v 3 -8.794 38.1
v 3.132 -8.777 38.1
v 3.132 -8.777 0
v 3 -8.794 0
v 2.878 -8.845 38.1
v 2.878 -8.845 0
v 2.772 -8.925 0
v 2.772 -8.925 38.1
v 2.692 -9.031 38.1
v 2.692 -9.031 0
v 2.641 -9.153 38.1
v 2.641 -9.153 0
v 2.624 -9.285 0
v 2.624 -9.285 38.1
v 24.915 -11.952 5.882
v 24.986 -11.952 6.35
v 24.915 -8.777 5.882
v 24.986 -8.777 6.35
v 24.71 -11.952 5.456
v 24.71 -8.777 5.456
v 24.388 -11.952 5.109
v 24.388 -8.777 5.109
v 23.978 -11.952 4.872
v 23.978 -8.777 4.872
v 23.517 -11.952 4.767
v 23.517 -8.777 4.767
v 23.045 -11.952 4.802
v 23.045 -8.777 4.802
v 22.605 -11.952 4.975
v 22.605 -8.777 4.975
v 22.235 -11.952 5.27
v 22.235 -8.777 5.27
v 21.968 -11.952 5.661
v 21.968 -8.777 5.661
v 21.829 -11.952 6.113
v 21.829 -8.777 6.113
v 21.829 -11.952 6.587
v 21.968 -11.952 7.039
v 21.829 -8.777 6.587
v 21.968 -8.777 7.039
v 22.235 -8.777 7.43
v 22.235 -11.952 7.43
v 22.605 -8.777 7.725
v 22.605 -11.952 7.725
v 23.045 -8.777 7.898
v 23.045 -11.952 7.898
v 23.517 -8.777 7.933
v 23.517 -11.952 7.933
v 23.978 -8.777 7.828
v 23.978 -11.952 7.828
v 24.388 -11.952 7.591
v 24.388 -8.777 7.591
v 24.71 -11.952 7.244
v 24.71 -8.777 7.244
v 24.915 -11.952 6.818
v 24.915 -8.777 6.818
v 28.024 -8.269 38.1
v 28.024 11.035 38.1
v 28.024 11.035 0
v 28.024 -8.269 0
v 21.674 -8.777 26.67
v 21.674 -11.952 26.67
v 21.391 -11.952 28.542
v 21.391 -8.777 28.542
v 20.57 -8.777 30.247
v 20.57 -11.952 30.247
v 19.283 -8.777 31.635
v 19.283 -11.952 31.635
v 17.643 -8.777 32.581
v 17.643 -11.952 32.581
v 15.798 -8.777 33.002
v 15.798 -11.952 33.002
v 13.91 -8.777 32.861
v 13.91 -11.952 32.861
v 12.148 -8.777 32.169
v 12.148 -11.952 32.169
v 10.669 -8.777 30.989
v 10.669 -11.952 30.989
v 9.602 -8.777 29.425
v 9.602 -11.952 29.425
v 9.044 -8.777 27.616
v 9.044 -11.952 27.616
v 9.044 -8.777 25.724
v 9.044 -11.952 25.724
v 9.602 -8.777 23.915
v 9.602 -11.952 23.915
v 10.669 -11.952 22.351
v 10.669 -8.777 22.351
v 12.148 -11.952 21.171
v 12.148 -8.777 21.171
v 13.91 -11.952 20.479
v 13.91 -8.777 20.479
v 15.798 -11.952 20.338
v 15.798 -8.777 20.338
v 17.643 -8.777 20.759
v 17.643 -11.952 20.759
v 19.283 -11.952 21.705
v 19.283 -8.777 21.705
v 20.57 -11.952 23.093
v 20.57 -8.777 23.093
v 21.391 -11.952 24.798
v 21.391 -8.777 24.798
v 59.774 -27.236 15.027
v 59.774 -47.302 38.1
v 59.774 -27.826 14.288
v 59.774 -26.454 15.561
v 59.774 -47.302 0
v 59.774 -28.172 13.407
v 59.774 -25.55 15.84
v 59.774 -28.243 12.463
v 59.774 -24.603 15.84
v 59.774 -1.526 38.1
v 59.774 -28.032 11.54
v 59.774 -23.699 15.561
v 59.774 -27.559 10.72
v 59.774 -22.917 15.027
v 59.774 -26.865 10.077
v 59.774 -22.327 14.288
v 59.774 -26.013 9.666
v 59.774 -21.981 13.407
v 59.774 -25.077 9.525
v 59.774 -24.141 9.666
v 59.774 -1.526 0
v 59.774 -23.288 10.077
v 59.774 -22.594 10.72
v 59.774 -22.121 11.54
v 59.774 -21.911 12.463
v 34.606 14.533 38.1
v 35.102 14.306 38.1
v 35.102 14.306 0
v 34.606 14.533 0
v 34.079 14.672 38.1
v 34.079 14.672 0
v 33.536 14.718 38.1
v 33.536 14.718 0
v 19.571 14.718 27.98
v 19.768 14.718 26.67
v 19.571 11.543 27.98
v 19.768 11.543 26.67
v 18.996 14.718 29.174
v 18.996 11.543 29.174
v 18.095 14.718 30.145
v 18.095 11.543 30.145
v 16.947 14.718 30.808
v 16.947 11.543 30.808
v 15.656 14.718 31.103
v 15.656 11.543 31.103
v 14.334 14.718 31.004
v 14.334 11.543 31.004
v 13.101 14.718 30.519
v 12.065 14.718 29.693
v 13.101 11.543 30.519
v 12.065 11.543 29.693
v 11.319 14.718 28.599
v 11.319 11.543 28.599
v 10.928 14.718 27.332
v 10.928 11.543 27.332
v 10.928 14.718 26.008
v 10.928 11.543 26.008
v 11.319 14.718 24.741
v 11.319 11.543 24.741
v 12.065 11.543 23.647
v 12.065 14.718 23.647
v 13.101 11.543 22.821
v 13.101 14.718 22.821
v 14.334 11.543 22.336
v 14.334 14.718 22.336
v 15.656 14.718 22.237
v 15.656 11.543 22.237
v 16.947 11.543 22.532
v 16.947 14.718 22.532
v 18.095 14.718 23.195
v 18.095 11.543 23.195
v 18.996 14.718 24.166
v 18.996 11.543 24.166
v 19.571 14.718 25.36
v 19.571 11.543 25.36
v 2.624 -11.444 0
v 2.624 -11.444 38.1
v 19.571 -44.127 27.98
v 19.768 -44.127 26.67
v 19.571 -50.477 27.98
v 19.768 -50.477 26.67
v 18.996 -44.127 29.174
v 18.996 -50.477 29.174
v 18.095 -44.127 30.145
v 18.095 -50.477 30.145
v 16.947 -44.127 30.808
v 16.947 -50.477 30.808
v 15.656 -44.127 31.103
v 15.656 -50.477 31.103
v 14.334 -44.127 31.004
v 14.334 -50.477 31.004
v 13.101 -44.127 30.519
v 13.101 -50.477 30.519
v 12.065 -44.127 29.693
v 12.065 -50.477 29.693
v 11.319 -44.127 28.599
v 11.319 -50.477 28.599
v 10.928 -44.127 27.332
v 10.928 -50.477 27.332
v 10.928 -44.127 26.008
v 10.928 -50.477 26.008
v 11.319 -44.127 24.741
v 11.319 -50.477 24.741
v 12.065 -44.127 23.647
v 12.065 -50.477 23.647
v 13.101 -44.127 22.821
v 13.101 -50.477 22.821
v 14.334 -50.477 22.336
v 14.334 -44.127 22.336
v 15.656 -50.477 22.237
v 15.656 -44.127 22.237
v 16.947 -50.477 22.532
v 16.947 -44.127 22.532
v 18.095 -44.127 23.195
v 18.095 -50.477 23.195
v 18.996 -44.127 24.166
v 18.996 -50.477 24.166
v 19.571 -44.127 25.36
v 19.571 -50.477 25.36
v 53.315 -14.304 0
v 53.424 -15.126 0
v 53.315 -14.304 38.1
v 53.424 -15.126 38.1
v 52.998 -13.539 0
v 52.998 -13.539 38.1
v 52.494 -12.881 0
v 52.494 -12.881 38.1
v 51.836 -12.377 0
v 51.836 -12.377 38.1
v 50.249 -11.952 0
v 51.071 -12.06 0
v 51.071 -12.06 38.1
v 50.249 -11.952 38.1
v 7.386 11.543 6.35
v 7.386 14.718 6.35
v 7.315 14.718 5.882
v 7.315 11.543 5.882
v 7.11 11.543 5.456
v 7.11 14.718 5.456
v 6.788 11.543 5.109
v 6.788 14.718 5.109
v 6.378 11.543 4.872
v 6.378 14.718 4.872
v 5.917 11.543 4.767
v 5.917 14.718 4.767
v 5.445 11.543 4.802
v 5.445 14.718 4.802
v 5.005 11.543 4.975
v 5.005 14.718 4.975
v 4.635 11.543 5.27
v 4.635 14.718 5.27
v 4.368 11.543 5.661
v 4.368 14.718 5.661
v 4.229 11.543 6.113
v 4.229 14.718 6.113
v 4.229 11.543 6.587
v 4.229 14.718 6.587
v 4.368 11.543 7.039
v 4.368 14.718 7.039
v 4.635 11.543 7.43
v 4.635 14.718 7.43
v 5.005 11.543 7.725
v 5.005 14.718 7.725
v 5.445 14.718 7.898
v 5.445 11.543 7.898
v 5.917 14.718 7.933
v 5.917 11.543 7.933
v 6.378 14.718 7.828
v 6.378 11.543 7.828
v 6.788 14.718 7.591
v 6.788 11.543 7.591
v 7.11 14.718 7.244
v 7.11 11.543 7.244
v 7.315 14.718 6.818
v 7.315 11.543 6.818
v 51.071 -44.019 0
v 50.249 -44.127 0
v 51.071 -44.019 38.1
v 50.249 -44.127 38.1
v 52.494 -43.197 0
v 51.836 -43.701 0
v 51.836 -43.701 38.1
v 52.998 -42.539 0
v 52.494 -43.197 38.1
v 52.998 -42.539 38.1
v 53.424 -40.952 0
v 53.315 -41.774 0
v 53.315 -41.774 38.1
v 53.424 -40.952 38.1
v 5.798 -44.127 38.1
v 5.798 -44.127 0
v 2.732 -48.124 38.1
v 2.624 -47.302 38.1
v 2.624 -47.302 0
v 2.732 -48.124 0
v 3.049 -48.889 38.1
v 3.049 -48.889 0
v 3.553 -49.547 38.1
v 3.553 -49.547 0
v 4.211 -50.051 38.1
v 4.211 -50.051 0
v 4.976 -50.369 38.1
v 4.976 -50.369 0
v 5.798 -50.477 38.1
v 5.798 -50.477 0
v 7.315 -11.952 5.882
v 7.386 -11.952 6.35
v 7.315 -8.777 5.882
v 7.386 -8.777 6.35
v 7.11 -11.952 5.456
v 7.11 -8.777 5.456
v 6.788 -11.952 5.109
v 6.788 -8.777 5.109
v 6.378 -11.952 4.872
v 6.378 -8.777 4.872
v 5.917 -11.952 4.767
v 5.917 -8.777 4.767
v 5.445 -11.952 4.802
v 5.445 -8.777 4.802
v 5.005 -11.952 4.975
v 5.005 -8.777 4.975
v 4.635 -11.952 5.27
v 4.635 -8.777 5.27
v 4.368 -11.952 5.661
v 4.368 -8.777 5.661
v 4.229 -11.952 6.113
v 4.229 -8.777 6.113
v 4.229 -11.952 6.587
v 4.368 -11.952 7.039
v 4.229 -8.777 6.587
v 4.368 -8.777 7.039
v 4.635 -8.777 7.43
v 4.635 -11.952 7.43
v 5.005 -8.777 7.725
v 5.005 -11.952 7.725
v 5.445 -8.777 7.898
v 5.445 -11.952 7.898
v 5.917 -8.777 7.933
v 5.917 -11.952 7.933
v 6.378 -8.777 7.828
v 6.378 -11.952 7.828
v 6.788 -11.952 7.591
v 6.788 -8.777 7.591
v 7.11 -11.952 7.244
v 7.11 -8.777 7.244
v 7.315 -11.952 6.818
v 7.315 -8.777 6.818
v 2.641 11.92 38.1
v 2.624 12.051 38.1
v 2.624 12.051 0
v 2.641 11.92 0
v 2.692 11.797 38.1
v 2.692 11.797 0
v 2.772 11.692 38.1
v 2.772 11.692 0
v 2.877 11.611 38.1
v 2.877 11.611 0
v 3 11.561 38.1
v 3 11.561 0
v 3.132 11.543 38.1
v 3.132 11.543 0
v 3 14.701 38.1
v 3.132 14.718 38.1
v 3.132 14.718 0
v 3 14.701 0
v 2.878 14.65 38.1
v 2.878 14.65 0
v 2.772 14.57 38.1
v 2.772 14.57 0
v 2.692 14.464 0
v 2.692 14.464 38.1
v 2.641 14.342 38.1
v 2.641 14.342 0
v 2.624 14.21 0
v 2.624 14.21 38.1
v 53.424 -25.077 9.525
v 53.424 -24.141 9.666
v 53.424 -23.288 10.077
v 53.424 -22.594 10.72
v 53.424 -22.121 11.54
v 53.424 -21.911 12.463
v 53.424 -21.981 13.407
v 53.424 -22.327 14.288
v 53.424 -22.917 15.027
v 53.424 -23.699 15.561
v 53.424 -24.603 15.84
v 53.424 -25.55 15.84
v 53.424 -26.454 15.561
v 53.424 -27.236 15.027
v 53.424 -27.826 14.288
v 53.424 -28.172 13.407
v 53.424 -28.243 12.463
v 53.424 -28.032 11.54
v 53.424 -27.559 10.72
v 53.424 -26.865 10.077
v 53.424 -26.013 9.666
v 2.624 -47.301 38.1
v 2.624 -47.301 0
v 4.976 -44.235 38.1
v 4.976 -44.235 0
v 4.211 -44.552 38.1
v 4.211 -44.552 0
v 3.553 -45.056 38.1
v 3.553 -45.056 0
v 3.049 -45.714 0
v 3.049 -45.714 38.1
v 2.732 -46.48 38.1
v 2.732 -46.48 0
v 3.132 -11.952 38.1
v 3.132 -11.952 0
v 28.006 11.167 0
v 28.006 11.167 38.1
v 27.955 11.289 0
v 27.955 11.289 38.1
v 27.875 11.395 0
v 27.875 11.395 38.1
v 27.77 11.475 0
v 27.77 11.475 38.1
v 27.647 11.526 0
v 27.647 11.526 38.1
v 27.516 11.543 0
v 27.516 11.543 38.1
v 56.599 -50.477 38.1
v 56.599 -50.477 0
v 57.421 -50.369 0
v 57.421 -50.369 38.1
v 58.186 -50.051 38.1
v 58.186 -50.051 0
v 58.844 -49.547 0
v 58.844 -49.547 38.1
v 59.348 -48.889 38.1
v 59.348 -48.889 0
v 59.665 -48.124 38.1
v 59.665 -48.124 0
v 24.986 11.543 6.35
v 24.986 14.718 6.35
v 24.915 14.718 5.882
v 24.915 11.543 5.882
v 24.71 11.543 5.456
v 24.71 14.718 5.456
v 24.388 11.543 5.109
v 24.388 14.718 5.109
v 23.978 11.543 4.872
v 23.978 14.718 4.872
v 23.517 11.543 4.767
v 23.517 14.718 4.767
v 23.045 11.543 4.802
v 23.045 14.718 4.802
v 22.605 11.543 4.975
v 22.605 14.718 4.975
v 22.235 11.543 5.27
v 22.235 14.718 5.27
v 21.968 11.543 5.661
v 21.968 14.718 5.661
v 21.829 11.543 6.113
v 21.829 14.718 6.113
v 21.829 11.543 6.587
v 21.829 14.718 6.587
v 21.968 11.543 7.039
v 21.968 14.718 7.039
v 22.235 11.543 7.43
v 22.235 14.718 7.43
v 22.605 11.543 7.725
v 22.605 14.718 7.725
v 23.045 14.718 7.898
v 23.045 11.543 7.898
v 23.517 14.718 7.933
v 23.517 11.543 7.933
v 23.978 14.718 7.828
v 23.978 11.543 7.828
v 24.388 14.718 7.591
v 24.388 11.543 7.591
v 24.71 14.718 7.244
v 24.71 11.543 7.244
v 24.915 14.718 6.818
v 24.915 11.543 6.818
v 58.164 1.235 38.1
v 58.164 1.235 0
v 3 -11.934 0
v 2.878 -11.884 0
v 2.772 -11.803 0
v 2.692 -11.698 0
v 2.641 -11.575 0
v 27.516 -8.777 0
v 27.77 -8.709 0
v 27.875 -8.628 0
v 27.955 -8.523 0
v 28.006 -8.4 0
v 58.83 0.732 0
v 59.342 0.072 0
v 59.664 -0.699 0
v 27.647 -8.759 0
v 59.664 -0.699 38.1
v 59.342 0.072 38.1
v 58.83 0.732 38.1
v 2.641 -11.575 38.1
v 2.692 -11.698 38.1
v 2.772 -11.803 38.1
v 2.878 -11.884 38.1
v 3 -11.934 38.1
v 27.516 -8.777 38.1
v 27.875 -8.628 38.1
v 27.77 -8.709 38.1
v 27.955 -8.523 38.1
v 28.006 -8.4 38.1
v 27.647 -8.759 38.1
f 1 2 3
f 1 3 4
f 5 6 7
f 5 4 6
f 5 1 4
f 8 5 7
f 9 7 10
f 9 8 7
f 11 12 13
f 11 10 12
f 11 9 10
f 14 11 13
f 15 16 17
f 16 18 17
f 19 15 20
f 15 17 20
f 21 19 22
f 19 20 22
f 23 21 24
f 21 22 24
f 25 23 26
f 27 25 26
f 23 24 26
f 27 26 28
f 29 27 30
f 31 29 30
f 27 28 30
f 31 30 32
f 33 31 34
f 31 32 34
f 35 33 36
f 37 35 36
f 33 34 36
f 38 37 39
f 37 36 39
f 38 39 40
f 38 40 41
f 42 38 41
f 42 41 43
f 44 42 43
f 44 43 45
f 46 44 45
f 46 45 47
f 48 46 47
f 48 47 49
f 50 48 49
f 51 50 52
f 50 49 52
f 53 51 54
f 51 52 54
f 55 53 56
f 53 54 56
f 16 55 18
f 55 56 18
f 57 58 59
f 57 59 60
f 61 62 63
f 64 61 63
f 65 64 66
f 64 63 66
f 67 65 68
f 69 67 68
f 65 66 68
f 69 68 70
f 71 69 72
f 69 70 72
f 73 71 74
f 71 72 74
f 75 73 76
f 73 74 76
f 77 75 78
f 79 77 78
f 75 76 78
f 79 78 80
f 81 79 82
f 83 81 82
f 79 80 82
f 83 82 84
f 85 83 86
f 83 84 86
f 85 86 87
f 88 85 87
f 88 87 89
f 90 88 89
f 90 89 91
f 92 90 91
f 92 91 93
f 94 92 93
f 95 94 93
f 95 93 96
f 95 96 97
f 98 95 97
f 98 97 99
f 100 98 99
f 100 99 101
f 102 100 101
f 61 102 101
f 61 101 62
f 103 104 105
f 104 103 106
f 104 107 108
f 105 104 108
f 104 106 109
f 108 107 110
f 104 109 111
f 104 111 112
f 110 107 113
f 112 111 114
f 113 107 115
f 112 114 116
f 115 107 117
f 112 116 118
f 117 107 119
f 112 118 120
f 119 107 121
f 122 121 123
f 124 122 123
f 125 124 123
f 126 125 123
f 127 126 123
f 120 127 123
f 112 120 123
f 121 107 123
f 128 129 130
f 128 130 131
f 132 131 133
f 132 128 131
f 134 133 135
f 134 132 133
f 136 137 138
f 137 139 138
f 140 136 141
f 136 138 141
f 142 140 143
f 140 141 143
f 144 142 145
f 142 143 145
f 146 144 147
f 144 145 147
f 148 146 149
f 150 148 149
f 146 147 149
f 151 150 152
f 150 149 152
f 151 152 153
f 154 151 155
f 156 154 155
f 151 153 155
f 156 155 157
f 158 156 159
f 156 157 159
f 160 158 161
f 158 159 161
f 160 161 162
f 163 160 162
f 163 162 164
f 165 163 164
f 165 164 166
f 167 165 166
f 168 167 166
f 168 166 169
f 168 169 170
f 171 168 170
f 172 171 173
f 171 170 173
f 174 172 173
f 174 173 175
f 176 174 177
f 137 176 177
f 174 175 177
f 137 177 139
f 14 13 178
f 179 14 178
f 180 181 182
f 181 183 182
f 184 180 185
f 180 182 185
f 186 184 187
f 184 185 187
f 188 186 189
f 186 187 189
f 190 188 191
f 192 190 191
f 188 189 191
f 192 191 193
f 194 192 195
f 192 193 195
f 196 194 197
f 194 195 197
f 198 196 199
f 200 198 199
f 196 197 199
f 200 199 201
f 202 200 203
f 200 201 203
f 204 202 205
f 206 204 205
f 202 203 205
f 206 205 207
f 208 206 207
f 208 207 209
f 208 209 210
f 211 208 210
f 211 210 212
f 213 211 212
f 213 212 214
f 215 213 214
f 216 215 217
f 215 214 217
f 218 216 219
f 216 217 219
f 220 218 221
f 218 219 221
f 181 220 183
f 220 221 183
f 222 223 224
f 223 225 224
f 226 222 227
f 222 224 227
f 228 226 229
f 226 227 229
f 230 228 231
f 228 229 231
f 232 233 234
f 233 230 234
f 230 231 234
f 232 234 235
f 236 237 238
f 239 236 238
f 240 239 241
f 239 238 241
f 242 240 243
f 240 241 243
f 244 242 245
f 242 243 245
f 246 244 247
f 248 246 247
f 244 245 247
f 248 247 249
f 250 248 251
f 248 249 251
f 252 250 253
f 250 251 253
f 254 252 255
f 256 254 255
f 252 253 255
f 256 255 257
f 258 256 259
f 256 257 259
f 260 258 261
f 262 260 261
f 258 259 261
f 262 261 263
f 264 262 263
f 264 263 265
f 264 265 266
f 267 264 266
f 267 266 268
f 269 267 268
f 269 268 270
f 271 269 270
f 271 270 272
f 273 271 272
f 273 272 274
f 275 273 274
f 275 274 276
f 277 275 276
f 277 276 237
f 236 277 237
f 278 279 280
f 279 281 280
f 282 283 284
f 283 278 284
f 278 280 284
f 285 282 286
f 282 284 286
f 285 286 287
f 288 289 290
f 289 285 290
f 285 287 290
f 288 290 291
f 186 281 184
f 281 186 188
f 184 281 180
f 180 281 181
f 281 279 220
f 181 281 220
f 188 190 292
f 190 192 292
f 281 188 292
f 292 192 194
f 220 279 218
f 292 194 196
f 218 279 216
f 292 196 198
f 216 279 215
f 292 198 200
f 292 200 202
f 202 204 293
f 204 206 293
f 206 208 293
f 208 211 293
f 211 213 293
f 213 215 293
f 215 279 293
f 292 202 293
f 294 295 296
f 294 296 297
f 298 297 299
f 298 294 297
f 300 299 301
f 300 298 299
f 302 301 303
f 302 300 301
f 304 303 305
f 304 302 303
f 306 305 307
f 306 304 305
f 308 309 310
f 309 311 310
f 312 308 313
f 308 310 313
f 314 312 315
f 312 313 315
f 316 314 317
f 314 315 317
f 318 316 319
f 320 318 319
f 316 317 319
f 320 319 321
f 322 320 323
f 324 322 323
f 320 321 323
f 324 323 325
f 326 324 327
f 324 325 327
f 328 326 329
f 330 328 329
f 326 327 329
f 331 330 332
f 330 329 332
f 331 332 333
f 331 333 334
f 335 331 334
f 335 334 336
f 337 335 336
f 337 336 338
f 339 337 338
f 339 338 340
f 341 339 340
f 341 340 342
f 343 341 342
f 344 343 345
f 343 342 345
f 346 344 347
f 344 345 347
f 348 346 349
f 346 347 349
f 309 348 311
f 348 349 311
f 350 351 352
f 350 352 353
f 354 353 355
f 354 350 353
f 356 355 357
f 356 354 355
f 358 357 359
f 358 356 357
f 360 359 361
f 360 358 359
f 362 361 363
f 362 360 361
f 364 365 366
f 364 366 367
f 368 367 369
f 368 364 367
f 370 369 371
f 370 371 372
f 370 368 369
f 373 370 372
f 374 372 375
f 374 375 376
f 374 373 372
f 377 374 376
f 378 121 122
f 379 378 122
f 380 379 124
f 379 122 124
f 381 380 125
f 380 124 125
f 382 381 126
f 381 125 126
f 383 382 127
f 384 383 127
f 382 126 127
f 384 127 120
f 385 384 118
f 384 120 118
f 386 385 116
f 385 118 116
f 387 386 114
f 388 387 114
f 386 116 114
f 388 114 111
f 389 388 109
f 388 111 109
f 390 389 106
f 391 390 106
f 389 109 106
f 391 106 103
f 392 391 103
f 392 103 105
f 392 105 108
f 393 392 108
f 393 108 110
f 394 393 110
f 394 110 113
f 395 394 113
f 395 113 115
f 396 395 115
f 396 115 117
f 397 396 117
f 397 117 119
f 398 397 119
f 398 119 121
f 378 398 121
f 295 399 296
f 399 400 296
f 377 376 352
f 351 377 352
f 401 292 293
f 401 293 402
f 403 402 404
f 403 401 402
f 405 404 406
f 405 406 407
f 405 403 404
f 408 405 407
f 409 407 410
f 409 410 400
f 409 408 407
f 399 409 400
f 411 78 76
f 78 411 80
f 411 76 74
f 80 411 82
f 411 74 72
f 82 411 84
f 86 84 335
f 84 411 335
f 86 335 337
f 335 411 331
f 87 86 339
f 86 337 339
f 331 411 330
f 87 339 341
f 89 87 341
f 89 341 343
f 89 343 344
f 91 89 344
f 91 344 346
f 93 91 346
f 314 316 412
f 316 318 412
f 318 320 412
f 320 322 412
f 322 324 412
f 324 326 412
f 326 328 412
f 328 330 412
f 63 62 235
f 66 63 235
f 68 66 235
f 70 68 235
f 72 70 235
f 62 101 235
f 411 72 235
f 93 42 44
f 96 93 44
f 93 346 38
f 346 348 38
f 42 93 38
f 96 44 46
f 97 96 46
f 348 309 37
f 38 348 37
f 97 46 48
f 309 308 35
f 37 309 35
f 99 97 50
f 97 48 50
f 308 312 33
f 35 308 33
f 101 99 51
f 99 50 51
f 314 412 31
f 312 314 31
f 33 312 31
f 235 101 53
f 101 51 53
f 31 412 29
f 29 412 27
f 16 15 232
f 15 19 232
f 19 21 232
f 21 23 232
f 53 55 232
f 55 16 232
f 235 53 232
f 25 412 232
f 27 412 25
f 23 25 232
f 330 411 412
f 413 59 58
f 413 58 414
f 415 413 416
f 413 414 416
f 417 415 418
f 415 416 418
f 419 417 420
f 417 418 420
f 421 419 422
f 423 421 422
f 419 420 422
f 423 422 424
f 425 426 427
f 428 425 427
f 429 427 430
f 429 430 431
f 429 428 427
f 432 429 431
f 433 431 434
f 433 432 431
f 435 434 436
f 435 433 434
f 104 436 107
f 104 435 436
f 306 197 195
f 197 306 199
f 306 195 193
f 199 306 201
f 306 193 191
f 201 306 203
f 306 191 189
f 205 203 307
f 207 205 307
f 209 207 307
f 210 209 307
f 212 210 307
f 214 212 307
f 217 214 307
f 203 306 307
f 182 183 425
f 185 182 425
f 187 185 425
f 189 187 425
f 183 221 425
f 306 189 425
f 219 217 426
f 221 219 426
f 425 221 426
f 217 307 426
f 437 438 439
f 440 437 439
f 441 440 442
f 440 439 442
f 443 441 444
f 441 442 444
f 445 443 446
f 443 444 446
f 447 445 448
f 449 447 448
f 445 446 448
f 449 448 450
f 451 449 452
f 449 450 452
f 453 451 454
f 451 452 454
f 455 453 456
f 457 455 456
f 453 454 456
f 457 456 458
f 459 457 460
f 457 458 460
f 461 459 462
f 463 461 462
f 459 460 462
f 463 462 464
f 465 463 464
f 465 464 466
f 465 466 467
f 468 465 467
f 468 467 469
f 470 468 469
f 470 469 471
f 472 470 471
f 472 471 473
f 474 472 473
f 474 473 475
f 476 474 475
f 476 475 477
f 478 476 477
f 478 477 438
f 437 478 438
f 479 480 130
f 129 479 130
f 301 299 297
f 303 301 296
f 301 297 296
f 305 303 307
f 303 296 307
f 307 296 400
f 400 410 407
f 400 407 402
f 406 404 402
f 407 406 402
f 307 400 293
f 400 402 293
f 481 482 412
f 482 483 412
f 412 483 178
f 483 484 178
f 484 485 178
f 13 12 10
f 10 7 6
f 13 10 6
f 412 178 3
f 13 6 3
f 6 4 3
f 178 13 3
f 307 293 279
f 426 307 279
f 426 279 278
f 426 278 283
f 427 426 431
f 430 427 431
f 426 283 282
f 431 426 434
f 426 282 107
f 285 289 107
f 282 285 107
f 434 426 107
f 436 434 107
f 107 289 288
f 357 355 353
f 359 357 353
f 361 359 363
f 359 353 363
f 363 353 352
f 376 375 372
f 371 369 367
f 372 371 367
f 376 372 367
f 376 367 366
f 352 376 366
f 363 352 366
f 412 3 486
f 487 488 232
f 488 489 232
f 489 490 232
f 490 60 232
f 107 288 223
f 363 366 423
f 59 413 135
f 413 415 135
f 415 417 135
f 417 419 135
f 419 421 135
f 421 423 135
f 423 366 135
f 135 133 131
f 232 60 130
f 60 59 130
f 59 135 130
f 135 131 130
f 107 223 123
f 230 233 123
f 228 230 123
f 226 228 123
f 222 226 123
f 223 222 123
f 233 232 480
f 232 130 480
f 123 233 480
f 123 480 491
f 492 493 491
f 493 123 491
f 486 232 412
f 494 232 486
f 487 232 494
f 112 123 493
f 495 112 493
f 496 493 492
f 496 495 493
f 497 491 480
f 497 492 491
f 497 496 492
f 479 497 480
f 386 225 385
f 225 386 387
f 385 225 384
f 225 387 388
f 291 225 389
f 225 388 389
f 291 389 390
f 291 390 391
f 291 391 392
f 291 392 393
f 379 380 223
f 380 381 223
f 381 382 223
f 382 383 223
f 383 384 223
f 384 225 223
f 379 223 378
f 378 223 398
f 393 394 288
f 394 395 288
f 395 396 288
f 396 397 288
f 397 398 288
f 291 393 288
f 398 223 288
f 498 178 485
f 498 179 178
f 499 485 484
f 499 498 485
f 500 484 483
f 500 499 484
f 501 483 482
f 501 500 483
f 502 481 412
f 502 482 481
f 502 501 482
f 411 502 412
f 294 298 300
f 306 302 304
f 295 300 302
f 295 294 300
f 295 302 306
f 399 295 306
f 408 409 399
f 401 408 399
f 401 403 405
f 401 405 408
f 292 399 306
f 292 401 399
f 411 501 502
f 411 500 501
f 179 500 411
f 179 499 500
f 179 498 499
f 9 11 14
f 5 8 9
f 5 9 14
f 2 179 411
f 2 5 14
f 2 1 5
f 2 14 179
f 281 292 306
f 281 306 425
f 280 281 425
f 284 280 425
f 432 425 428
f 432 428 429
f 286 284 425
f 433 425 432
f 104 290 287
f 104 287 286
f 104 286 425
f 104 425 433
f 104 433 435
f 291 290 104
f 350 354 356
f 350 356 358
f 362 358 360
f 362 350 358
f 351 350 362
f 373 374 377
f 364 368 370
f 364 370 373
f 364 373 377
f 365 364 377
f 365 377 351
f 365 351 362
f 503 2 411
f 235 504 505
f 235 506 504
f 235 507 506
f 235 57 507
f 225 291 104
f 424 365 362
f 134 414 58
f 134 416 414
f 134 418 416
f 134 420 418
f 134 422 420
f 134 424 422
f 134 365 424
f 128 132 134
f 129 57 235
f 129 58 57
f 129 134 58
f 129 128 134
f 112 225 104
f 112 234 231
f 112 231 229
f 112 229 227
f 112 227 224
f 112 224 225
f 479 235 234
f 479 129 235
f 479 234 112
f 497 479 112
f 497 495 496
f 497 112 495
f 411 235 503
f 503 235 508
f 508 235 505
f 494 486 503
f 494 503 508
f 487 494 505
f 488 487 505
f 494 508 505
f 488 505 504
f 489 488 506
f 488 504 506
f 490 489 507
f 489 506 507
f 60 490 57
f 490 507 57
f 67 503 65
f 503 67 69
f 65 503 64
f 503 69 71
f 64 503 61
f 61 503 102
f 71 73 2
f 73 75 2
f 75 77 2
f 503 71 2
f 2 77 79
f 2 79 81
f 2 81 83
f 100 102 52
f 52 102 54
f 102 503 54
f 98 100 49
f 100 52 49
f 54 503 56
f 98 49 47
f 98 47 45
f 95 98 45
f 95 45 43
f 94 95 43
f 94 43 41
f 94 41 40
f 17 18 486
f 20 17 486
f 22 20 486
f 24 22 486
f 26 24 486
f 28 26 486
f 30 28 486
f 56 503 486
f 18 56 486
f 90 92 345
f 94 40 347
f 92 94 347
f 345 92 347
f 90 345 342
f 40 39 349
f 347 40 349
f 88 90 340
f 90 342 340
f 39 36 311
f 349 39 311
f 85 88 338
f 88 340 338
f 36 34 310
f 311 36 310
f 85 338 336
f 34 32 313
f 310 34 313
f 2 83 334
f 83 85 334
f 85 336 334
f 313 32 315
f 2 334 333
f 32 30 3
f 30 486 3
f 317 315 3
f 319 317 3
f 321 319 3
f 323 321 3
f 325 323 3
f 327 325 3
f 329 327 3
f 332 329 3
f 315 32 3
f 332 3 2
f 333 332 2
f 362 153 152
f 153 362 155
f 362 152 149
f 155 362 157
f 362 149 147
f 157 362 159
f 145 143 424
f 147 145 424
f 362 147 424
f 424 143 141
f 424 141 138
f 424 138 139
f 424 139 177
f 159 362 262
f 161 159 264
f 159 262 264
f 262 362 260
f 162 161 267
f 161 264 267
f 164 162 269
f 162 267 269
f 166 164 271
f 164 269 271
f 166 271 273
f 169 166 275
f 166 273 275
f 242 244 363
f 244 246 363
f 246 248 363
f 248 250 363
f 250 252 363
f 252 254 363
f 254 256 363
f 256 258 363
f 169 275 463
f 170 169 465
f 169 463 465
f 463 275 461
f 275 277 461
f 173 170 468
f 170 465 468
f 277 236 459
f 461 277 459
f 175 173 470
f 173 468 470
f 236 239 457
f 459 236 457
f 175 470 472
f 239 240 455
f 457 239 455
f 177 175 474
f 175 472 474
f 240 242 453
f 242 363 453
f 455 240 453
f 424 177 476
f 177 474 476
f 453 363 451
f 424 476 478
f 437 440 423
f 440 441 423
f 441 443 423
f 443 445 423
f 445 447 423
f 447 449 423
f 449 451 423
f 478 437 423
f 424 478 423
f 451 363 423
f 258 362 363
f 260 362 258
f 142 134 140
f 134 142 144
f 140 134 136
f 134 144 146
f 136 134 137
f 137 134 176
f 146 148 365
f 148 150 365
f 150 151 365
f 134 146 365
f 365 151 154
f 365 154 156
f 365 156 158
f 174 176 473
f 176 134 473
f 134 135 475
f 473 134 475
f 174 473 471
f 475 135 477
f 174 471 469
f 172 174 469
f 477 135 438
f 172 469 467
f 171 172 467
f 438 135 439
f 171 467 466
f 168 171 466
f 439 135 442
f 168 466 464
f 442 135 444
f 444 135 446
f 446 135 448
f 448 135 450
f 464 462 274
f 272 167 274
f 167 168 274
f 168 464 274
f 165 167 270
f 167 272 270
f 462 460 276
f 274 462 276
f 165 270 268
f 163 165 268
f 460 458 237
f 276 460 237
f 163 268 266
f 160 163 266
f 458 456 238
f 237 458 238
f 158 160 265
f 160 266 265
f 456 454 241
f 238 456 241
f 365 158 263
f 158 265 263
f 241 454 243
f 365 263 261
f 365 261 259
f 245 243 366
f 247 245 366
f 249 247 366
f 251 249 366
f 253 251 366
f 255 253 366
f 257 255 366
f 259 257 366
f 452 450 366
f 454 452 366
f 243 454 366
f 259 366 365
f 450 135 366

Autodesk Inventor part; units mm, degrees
ref_plane "YZ Plane" through (0, 0, 0) normal (1, 0, 0) x (0, 1, 0)
ref_plane "XZ Plane" through (0, 0, 0) normal (0, 1, 0) x (-1, 0, 0)
ref_plane "XY Plane" through (0, 0, 0) normal (0, 0, 1) x (1, 0, 0)
sketch "Sketch1" plane through (0, 0, 0) normal (0, 0, 1) x (1, 0, 0)
  line L0 (2.6235, 11.5434) -> (28.0235, 11.5434)
  line L1 (28.0235, 11.5434) -> (28.0235, 14.7184)
  line L2 (28.0235, 14.7184) -> (2.6235, 14.7184)
  line L3 (2.6235, 14.7184) -> (2.6235, 11.5434)
  line L4 (28.0235, -8.7766) -> (2.6235, -8.7766)
  line L5 (2.6235, -8.7766) -> (2.6235, -11.9516)
  line L6 (2.6235, -11.9516) -> (28.0235, -11.9516)
  line L7 (28.0235, -11.9516) -> (28.0235, -8.7766)
  line L8 (28.0235, -11.9516) -> (34.3735, -11.9516)
  line L9 (34.3735, -11.9516) -> (34.3735, 14.7184)
  line L10 (34.3735, 14.7184) -> (28.0235, 14.7184)
  line L11 (28.0235, 14.7184) -> (28.0235, -11.9516)
  line L12 (2.6235, -50.4767) -> (53.4235, -50.4767)
  line L13 (53.4235, -50.4767) -> (53.4235, -44.1267)
  line L14 (53.4235, -44.1267) -> (2.6235, -44.1267)
  line L15 (2.6235, -44.1267) -> (2.6235, -50.4767)
  line L16 (53.4235, -50.4767) -> (59.7735, -50.4767)
  line L17 (59.7735, -50.4767) -> (59.7735, 0.3233)
  line L18 (59.7735, 0.3233) -> (53.4235, 0.3233)
  line L19 (53.4235, 0.3233) -> (53.4235, -50.4767)
  line L20 (34.3735, -11.9516) -> (53.4235, -11.9516)
  line L21 (59.7735, 0.3233) -> (34.3735, 14.7184)
  point P0 (0, 0)
  dimension "d22" = 27.94
  dimension "d0" = 25.4
  dimension "d1" = 3.175
  dimension "d2" = 3.175
  dimension "d3" = 20.32
  dimension "d4" = 6.35
  dimension "d5" = 50.8
  dimension "d6" = 6.35
  dimension "d7" = 6.35
  dimension "d8" = 50.8
extrude "Extrusion1" add sketch "Sketch1" along normal blind 38.1
sketch "Sketch2" plane through (59.7735, -50.4767, 0) normal (1, 0, 0) x (0, 0, -1)
  circle A0 centre (-12.7, 25.4) radius 3.175
  line L0 (0, 50.8) -> (-38.1, 50.8) projected
  line L1 (-38.1, 0) -> (-38.1, 50.8) projected
  point P0 (0, 50.4767)
  dimension "d11" = 6.35
  dimension "d12" = 25.4
  dimension "d13" = 25.4
extrude "Extrusion2" cut sketch "Sketch2" against normal blind 25.4
sketch "Sketch3" plane through (2.6235, 14.7184, 0) normal (0, 1, 0) x (1, 0, 0)
  circle A0 centre (3.175, -6.35) radius 1.5875
  circle A1 centre (20.775, -6.35) radius 1.5875
  line L0 (31.75, 0) -> (0, 0) projected
  line L1 (0, 0) -> (0, -38.1) projected
  point P0 (-2.6235, 0)
  dimension "d16" = 3.175
  dimension "d17" = 3.175
  dimension "d18" = 6.35
  dimension "d19" = 6.35
  dimension "d20" = 17.6
  dimension "d21" = 3.175
extrude "Extrusion3" cut sketch "Sketch3" against normal blind 27.94
fillet "Fillet1" radius 3.175 7 edges at (34.3735, 14.7184, 19.05) (59.7735, 0.3233, 19.05) (59.7735, -50.4767, 19.05) (53.4235, -11.9516, 19.05) (53.4235, -44.1267, 19.05) (2.6235, -50.4767, 19.05) (2.6235, -44.1267, 19.05)
fillet "Fillet2" radius 0.508 6 edges at (2.6235, -8.7766, 19.05) (2.6235, -11.9516, 19.05) (2.6235, 11.5434, 19.05) (2.6235, 14.7184, 19.05) (28.0235, 11.5434, 19.05) (28.0235, -8.7766, 19.05)
sketch "Sketch4" plane through (5.7985, -50.4767, 0) normal (0, -1, 0) x (1, 0, 0)
  circle A0 centre (9.525, 26.67) radius 4.445
  line L0 (-3.175, 38.1) -> (-3.175, 0) projected
  line L1 (0, 38.1) -> (50.8, 38.1) projected
  point P0 (-5.7985, 0)
  dimension "d26" = 8.89
  dimension "d28" = 12.7
  dimension "d29" = 11.43
extrude "Extrusion4" cut sketch "Sketch4" against normal blind 101.6
sketch "Sketch5" plane through (50.2485, -11.9516, 0) normal (0, -1, 0) x (1, 0, 0)
  circle A0 centre (-34.925, 26.67) radius 4.445 projected
  circle A1 centre (-34.925, 26.67) radius 6.35
  point P0 (-50.2485, 0)
  dimension "d32" = 12.7
extrude "Extrusion5" cut sketch "Sketch5" against normal blind 5.08
equation "\"d14\" = d12"
properties part number "SwerveBracket"
